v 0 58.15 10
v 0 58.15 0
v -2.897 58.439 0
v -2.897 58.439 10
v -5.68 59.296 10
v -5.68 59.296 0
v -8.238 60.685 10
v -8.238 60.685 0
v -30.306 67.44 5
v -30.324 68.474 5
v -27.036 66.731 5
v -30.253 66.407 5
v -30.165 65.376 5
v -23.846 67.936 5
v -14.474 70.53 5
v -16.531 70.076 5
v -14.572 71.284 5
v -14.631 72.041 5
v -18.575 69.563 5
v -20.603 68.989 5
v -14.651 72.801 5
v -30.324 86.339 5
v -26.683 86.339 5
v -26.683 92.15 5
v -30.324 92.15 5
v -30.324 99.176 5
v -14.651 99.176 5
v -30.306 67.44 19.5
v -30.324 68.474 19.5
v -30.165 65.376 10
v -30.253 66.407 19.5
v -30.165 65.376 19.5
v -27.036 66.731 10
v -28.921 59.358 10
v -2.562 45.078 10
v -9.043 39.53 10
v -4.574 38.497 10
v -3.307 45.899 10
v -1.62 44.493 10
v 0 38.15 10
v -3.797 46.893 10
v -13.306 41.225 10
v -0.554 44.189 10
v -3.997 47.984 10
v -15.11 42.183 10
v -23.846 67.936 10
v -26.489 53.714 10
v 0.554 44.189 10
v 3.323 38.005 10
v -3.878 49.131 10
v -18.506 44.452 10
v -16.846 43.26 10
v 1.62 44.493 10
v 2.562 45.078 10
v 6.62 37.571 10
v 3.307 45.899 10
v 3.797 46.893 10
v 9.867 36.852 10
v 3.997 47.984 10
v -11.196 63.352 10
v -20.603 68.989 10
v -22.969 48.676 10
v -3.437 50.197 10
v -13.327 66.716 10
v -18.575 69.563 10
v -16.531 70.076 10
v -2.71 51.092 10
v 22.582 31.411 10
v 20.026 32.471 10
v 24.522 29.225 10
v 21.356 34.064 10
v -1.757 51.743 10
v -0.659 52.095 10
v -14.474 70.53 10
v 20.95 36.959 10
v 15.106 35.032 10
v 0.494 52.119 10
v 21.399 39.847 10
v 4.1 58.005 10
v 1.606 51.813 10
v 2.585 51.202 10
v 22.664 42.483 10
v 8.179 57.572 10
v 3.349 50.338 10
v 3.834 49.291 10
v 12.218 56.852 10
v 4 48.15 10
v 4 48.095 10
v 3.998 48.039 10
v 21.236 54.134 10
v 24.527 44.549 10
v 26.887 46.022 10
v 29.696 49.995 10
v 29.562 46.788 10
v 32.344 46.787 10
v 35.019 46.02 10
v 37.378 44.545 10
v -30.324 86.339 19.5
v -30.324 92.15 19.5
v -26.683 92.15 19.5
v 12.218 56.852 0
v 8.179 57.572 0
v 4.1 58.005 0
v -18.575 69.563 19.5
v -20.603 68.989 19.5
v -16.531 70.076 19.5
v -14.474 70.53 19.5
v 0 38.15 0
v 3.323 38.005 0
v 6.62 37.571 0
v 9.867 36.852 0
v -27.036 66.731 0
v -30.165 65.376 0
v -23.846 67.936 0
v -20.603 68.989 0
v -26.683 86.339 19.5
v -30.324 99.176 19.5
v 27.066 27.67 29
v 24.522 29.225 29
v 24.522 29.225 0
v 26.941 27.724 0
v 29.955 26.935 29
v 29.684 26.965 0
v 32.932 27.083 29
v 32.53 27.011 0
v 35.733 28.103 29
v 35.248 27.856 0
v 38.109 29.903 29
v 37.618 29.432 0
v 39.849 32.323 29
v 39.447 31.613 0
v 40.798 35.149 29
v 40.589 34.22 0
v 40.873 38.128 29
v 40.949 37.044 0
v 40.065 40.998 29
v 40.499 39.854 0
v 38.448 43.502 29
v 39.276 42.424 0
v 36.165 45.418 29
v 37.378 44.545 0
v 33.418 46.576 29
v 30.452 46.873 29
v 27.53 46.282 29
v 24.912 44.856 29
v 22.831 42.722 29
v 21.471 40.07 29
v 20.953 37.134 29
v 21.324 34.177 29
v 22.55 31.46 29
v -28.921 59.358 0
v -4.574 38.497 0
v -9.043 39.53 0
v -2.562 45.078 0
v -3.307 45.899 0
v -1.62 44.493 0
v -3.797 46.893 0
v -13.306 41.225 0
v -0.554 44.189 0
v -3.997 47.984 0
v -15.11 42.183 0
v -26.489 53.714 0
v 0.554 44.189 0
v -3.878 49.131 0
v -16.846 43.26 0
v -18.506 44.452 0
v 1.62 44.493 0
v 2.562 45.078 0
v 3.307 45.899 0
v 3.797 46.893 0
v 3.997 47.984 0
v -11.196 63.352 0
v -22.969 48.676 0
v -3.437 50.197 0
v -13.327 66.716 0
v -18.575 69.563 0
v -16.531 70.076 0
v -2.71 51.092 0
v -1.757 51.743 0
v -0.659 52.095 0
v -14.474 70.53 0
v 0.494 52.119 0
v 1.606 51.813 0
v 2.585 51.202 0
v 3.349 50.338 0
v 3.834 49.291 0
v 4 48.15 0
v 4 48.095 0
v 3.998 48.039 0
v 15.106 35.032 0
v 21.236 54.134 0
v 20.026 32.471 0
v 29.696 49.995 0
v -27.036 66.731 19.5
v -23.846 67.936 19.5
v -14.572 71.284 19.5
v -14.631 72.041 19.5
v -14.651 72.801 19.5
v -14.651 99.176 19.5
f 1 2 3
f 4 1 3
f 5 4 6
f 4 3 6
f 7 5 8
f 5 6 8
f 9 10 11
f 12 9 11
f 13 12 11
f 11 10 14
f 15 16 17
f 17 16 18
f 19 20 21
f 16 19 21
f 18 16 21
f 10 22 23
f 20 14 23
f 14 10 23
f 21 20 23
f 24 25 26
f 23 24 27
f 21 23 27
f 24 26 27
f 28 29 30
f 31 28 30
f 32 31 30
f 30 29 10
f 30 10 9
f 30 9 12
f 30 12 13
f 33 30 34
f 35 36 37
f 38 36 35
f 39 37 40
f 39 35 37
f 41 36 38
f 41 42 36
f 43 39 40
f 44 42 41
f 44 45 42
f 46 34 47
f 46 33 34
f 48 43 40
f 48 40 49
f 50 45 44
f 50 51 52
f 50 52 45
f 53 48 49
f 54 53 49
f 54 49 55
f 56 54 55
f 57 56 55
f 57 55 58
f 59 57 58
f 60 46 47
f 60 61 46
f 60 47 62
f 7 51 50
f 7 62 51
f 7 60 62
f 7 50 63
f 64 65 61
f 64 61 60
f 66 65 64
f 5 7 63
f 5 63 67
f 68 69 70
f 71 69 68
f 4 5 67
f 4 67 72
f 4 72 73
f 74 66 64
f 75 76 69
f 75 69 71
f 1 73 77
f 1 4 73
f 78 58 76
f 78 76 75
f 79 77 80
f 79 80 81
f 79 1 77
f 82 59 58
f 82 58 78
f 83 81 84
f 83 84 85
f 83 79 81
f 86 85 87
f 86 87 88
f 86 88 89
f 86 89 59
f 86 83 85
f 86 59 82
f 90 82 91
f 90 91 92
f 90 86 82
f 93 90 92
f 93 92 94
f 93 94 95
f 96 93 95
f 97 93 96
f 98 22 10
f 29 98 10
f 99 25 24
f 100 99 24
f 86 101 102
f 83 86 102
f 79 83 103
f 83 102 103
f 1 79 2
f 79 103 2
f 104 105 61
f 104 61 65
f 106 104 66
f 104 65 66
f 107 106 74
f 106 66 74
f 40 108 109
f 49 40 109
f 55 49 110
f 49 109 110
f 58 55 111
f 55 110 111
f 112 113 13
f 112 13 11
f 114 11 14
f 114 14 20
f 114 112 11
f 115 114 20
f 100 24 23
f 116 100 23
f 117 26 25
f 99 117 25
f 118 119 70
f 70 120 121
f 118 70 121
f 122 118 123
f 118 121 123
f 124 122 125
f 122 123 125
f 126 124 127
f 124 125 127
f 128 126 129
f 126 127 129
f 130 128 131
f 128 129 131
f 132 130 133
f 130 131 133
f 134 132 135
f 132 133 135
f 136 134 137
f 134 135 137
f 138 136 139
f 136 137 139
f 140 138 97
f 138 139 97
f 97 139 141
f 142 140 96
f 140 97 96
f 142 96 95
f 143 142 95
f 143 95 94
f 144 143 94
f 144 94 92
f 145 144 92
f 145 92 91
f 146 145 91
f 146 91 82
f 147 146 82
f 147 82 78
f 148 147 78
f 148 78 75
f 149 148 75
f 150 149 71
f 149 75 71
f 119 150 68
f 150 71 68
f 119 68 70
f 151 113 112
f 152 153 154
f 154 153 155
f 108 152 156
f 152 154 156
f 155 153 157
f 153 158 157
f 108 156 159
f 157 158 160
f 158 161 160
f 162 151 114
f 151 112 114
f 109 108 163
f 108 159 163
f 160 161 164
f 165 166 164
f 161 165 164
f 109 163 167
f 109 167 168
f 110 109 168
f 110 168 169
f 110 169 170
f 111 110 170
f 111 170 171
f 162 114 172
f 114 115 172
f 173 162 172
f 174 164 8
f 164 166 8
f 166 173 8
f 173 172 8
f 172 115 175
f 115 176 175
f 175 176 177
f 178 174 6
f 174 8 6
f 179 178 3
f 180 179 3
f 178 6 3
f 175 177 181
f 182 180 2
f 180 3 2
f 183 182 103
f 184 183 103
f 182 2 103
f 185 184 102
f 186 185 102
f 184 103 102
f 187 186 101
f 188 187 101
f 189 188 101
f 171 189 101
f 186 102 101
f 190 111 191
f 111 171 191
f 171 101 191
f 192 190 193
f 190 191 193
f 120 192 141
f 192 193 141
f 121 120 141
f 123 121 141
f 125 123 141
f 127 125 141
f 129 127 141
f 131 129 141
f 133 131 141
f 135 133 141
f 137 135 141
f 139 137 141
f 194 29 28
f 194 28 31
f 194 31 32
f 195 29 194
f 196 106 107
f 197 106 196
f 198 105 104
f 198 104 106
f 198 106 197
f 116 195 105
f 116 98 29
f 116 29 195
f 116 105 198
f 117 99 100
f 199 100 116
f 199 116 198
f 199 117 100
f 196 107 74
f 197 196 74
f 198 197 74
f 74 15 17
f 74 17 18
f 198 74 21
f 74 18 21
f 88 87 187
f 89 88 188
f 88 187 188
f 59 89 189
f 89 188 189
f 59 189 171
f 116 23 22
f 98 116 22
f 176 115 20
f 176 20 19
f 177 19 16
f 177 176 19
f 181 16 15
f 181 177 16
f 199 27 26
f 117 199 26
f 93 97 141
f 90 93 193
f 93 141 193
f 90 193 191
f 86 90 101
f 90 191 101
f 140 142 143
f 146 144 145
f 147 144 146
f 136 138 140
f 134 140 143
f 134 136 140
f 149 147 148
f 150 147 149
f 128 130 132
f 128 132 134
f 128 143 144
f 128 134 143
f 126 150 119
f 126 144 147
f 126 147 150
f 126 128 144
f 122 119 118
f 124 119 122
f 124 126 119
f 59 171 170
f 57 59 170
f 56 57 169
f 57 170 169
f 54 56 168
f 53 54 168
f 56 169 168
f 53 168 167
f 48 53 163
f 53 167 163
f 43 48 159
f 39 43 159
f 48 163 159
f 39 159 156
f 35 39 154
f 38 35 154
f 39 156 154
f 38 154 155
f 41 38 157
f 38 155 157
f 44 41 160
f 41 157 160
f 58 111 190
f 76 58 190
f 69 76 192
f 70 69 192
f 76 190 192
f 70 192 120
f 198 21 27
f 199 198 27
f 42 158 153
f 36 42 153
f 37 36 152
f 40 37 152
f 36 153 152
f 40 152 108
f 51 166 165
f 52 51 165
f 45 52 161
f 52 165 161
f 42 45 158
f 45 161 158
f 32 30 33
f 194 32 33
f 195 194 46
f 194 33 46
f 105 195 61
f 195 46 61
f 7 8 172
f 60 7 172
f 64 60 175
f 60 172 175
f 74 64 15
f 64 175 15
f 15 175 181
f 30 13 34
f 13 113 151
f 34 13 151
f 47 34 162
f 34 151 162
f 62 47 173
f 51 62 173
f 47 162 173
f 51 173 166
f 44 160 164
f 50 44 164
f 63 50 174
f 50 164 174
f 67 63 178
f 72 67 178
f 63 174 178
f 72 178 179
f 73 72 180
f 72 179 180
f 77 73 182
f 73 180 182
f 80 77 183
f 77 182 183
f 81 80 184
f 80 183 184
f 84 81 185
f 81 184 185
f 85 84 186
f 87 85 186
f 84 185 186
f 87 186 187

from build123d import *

# Parameters (mm, degrees)
SKETCH_8_R          = 4
EXTRUDE_2549_DEPTH  = 10
SKETCH_9_R          = 10
EXTRUDE_3976_DEPTH  = 29
EXTRUDE_1_DEPTH     = 19.5
CUT_EXTRUDE_1_DEPTH = 5


with BuildPart() as part:
    # Эскиз основа<8> → Extrude 2549 (new body)
    with BuildSketch(Plane.XY):
        with BuildLine():
            ThreePointArc((-30.165303473, 65.376253077), (-20.317568692, 45.96310484), (0, 38.15))
            ThreePointArc((0, 38.15), (13.048068468, 35.849273483), (24.52234731, 29.224595505))
            ThreePointArc((24.52234731, 29.224595505), (23.289778975, 43.312916033), (37.378099503, 44.545484367))
            ThreePointArc((37.378099503, 44.545484367), (19.888471334, 54.643125899), (0, 58.15))
            ThreePointArc((0, 58.15), (-9.523070426, 61.66726776), (-14.473600663, 70.530240917))
            ThreePointArc((-14.473600663, 70.530240917), (-22.467728819, 68.404686694), (-30.165303473, 65.376253077))
        make_face()
        with Locations((0, 48.15)):
            Circle(SKETCH_8_R, mode=Mode.SUBTRACT)
    extrude(amount=EXTRUDE_2549_DEPTH)

    # Sketch 9 → Extrude 3976 (add)
    with BuildSketch(Plane.XY):
        with Locations((30.950223406, 36.885039936)):
            Circle(SKETCH_9_R)
    extrude(amount=EXTRUDE_3976_DEPTH)

    # Эскиз основа<11> → Бобышка-Вытянуть1 (add)
    with BuildSketch(Plane.XY):
        with BuildLine():
            ThreePointArc((-30.323937444, 68.473937444), (-30.284252984, 66.923065659), (-30.165303473, 65.376253077))
            ThreePointArc((-30.165303473, 65.376253077), (-22.467728819, 68.404686694), (-14.473600663, 70.530240917))
            ThreePointArc((-14.473600663, 70.530240917), (-14.606270011, 71.661967819), (-14.650582479, 72.800582479))
            Line((-14.650582479, 72.800582479), (-14.650582479, 99.176328781))
            Line((-14.650582479, 99.176328781), (-30.323937444, 99.176328781))
            Line((-30.323937444, 99.176328781), (-30.323937444, 92.15))
            Line((-30.323937444, 92.15), (-26.682795781, 92.15))
            Line((-26.682795781, 92.15), (-26.682795781, 86.338672823))
            Line((-26.682795781, 86.338672823), (-30.323937444, 86.338672823))
            Line((-30.323937444, 86.338672823), (-30.323937444, 68.473937444))
        make_face()
    extrude(amount=EXTRUDE_1_DEPTH)

    # Эскиз основа<12> → Вырез-Вытянуть1 (cut)
    with BuildSketch(Plane.XY):
        with BuildLine():
            ThreePointArc((-30.323937444, 68.473937444), (-30.284252984, 66.923065659), (-30.165303473, 65.376253077))
            ThreePointArc((-30.165303473, 65.376253077), (-22.467728819, 68.404686694), (-14.473600663, 70.530240917))
            ThreePointArc((-14.473600663, 70.530240917), (-14.606270011, 71.661967819), (-14.650582479, 72.800582479))
            Line((-14.650582479, 72.800582479), (-14.650582479, 99.176328781))
            Line((-14.650582479, 99.176328781), (-30.323937444, 99.176328781))
            Line((-30.323937444, 99.176328781), (-30.323937444, 92.15))
            Line((-30.323937444, 92.15), (-26.682795781, 92.15))
            Line((-26.682795781, 92.15), (-26.682795781, 86.338672823))
            Line((-26.682795781, 86.338672823), (-30.323937444, 86.338672823))
            Line((-30.323937444, 86.338672823), (-30.323937444, 68.473937444))
        make_face()
    extrude(amount=CUT_EXTRUDE_1_DEPTH, mode=Mode.SUBTRACT)


solid = part.part
